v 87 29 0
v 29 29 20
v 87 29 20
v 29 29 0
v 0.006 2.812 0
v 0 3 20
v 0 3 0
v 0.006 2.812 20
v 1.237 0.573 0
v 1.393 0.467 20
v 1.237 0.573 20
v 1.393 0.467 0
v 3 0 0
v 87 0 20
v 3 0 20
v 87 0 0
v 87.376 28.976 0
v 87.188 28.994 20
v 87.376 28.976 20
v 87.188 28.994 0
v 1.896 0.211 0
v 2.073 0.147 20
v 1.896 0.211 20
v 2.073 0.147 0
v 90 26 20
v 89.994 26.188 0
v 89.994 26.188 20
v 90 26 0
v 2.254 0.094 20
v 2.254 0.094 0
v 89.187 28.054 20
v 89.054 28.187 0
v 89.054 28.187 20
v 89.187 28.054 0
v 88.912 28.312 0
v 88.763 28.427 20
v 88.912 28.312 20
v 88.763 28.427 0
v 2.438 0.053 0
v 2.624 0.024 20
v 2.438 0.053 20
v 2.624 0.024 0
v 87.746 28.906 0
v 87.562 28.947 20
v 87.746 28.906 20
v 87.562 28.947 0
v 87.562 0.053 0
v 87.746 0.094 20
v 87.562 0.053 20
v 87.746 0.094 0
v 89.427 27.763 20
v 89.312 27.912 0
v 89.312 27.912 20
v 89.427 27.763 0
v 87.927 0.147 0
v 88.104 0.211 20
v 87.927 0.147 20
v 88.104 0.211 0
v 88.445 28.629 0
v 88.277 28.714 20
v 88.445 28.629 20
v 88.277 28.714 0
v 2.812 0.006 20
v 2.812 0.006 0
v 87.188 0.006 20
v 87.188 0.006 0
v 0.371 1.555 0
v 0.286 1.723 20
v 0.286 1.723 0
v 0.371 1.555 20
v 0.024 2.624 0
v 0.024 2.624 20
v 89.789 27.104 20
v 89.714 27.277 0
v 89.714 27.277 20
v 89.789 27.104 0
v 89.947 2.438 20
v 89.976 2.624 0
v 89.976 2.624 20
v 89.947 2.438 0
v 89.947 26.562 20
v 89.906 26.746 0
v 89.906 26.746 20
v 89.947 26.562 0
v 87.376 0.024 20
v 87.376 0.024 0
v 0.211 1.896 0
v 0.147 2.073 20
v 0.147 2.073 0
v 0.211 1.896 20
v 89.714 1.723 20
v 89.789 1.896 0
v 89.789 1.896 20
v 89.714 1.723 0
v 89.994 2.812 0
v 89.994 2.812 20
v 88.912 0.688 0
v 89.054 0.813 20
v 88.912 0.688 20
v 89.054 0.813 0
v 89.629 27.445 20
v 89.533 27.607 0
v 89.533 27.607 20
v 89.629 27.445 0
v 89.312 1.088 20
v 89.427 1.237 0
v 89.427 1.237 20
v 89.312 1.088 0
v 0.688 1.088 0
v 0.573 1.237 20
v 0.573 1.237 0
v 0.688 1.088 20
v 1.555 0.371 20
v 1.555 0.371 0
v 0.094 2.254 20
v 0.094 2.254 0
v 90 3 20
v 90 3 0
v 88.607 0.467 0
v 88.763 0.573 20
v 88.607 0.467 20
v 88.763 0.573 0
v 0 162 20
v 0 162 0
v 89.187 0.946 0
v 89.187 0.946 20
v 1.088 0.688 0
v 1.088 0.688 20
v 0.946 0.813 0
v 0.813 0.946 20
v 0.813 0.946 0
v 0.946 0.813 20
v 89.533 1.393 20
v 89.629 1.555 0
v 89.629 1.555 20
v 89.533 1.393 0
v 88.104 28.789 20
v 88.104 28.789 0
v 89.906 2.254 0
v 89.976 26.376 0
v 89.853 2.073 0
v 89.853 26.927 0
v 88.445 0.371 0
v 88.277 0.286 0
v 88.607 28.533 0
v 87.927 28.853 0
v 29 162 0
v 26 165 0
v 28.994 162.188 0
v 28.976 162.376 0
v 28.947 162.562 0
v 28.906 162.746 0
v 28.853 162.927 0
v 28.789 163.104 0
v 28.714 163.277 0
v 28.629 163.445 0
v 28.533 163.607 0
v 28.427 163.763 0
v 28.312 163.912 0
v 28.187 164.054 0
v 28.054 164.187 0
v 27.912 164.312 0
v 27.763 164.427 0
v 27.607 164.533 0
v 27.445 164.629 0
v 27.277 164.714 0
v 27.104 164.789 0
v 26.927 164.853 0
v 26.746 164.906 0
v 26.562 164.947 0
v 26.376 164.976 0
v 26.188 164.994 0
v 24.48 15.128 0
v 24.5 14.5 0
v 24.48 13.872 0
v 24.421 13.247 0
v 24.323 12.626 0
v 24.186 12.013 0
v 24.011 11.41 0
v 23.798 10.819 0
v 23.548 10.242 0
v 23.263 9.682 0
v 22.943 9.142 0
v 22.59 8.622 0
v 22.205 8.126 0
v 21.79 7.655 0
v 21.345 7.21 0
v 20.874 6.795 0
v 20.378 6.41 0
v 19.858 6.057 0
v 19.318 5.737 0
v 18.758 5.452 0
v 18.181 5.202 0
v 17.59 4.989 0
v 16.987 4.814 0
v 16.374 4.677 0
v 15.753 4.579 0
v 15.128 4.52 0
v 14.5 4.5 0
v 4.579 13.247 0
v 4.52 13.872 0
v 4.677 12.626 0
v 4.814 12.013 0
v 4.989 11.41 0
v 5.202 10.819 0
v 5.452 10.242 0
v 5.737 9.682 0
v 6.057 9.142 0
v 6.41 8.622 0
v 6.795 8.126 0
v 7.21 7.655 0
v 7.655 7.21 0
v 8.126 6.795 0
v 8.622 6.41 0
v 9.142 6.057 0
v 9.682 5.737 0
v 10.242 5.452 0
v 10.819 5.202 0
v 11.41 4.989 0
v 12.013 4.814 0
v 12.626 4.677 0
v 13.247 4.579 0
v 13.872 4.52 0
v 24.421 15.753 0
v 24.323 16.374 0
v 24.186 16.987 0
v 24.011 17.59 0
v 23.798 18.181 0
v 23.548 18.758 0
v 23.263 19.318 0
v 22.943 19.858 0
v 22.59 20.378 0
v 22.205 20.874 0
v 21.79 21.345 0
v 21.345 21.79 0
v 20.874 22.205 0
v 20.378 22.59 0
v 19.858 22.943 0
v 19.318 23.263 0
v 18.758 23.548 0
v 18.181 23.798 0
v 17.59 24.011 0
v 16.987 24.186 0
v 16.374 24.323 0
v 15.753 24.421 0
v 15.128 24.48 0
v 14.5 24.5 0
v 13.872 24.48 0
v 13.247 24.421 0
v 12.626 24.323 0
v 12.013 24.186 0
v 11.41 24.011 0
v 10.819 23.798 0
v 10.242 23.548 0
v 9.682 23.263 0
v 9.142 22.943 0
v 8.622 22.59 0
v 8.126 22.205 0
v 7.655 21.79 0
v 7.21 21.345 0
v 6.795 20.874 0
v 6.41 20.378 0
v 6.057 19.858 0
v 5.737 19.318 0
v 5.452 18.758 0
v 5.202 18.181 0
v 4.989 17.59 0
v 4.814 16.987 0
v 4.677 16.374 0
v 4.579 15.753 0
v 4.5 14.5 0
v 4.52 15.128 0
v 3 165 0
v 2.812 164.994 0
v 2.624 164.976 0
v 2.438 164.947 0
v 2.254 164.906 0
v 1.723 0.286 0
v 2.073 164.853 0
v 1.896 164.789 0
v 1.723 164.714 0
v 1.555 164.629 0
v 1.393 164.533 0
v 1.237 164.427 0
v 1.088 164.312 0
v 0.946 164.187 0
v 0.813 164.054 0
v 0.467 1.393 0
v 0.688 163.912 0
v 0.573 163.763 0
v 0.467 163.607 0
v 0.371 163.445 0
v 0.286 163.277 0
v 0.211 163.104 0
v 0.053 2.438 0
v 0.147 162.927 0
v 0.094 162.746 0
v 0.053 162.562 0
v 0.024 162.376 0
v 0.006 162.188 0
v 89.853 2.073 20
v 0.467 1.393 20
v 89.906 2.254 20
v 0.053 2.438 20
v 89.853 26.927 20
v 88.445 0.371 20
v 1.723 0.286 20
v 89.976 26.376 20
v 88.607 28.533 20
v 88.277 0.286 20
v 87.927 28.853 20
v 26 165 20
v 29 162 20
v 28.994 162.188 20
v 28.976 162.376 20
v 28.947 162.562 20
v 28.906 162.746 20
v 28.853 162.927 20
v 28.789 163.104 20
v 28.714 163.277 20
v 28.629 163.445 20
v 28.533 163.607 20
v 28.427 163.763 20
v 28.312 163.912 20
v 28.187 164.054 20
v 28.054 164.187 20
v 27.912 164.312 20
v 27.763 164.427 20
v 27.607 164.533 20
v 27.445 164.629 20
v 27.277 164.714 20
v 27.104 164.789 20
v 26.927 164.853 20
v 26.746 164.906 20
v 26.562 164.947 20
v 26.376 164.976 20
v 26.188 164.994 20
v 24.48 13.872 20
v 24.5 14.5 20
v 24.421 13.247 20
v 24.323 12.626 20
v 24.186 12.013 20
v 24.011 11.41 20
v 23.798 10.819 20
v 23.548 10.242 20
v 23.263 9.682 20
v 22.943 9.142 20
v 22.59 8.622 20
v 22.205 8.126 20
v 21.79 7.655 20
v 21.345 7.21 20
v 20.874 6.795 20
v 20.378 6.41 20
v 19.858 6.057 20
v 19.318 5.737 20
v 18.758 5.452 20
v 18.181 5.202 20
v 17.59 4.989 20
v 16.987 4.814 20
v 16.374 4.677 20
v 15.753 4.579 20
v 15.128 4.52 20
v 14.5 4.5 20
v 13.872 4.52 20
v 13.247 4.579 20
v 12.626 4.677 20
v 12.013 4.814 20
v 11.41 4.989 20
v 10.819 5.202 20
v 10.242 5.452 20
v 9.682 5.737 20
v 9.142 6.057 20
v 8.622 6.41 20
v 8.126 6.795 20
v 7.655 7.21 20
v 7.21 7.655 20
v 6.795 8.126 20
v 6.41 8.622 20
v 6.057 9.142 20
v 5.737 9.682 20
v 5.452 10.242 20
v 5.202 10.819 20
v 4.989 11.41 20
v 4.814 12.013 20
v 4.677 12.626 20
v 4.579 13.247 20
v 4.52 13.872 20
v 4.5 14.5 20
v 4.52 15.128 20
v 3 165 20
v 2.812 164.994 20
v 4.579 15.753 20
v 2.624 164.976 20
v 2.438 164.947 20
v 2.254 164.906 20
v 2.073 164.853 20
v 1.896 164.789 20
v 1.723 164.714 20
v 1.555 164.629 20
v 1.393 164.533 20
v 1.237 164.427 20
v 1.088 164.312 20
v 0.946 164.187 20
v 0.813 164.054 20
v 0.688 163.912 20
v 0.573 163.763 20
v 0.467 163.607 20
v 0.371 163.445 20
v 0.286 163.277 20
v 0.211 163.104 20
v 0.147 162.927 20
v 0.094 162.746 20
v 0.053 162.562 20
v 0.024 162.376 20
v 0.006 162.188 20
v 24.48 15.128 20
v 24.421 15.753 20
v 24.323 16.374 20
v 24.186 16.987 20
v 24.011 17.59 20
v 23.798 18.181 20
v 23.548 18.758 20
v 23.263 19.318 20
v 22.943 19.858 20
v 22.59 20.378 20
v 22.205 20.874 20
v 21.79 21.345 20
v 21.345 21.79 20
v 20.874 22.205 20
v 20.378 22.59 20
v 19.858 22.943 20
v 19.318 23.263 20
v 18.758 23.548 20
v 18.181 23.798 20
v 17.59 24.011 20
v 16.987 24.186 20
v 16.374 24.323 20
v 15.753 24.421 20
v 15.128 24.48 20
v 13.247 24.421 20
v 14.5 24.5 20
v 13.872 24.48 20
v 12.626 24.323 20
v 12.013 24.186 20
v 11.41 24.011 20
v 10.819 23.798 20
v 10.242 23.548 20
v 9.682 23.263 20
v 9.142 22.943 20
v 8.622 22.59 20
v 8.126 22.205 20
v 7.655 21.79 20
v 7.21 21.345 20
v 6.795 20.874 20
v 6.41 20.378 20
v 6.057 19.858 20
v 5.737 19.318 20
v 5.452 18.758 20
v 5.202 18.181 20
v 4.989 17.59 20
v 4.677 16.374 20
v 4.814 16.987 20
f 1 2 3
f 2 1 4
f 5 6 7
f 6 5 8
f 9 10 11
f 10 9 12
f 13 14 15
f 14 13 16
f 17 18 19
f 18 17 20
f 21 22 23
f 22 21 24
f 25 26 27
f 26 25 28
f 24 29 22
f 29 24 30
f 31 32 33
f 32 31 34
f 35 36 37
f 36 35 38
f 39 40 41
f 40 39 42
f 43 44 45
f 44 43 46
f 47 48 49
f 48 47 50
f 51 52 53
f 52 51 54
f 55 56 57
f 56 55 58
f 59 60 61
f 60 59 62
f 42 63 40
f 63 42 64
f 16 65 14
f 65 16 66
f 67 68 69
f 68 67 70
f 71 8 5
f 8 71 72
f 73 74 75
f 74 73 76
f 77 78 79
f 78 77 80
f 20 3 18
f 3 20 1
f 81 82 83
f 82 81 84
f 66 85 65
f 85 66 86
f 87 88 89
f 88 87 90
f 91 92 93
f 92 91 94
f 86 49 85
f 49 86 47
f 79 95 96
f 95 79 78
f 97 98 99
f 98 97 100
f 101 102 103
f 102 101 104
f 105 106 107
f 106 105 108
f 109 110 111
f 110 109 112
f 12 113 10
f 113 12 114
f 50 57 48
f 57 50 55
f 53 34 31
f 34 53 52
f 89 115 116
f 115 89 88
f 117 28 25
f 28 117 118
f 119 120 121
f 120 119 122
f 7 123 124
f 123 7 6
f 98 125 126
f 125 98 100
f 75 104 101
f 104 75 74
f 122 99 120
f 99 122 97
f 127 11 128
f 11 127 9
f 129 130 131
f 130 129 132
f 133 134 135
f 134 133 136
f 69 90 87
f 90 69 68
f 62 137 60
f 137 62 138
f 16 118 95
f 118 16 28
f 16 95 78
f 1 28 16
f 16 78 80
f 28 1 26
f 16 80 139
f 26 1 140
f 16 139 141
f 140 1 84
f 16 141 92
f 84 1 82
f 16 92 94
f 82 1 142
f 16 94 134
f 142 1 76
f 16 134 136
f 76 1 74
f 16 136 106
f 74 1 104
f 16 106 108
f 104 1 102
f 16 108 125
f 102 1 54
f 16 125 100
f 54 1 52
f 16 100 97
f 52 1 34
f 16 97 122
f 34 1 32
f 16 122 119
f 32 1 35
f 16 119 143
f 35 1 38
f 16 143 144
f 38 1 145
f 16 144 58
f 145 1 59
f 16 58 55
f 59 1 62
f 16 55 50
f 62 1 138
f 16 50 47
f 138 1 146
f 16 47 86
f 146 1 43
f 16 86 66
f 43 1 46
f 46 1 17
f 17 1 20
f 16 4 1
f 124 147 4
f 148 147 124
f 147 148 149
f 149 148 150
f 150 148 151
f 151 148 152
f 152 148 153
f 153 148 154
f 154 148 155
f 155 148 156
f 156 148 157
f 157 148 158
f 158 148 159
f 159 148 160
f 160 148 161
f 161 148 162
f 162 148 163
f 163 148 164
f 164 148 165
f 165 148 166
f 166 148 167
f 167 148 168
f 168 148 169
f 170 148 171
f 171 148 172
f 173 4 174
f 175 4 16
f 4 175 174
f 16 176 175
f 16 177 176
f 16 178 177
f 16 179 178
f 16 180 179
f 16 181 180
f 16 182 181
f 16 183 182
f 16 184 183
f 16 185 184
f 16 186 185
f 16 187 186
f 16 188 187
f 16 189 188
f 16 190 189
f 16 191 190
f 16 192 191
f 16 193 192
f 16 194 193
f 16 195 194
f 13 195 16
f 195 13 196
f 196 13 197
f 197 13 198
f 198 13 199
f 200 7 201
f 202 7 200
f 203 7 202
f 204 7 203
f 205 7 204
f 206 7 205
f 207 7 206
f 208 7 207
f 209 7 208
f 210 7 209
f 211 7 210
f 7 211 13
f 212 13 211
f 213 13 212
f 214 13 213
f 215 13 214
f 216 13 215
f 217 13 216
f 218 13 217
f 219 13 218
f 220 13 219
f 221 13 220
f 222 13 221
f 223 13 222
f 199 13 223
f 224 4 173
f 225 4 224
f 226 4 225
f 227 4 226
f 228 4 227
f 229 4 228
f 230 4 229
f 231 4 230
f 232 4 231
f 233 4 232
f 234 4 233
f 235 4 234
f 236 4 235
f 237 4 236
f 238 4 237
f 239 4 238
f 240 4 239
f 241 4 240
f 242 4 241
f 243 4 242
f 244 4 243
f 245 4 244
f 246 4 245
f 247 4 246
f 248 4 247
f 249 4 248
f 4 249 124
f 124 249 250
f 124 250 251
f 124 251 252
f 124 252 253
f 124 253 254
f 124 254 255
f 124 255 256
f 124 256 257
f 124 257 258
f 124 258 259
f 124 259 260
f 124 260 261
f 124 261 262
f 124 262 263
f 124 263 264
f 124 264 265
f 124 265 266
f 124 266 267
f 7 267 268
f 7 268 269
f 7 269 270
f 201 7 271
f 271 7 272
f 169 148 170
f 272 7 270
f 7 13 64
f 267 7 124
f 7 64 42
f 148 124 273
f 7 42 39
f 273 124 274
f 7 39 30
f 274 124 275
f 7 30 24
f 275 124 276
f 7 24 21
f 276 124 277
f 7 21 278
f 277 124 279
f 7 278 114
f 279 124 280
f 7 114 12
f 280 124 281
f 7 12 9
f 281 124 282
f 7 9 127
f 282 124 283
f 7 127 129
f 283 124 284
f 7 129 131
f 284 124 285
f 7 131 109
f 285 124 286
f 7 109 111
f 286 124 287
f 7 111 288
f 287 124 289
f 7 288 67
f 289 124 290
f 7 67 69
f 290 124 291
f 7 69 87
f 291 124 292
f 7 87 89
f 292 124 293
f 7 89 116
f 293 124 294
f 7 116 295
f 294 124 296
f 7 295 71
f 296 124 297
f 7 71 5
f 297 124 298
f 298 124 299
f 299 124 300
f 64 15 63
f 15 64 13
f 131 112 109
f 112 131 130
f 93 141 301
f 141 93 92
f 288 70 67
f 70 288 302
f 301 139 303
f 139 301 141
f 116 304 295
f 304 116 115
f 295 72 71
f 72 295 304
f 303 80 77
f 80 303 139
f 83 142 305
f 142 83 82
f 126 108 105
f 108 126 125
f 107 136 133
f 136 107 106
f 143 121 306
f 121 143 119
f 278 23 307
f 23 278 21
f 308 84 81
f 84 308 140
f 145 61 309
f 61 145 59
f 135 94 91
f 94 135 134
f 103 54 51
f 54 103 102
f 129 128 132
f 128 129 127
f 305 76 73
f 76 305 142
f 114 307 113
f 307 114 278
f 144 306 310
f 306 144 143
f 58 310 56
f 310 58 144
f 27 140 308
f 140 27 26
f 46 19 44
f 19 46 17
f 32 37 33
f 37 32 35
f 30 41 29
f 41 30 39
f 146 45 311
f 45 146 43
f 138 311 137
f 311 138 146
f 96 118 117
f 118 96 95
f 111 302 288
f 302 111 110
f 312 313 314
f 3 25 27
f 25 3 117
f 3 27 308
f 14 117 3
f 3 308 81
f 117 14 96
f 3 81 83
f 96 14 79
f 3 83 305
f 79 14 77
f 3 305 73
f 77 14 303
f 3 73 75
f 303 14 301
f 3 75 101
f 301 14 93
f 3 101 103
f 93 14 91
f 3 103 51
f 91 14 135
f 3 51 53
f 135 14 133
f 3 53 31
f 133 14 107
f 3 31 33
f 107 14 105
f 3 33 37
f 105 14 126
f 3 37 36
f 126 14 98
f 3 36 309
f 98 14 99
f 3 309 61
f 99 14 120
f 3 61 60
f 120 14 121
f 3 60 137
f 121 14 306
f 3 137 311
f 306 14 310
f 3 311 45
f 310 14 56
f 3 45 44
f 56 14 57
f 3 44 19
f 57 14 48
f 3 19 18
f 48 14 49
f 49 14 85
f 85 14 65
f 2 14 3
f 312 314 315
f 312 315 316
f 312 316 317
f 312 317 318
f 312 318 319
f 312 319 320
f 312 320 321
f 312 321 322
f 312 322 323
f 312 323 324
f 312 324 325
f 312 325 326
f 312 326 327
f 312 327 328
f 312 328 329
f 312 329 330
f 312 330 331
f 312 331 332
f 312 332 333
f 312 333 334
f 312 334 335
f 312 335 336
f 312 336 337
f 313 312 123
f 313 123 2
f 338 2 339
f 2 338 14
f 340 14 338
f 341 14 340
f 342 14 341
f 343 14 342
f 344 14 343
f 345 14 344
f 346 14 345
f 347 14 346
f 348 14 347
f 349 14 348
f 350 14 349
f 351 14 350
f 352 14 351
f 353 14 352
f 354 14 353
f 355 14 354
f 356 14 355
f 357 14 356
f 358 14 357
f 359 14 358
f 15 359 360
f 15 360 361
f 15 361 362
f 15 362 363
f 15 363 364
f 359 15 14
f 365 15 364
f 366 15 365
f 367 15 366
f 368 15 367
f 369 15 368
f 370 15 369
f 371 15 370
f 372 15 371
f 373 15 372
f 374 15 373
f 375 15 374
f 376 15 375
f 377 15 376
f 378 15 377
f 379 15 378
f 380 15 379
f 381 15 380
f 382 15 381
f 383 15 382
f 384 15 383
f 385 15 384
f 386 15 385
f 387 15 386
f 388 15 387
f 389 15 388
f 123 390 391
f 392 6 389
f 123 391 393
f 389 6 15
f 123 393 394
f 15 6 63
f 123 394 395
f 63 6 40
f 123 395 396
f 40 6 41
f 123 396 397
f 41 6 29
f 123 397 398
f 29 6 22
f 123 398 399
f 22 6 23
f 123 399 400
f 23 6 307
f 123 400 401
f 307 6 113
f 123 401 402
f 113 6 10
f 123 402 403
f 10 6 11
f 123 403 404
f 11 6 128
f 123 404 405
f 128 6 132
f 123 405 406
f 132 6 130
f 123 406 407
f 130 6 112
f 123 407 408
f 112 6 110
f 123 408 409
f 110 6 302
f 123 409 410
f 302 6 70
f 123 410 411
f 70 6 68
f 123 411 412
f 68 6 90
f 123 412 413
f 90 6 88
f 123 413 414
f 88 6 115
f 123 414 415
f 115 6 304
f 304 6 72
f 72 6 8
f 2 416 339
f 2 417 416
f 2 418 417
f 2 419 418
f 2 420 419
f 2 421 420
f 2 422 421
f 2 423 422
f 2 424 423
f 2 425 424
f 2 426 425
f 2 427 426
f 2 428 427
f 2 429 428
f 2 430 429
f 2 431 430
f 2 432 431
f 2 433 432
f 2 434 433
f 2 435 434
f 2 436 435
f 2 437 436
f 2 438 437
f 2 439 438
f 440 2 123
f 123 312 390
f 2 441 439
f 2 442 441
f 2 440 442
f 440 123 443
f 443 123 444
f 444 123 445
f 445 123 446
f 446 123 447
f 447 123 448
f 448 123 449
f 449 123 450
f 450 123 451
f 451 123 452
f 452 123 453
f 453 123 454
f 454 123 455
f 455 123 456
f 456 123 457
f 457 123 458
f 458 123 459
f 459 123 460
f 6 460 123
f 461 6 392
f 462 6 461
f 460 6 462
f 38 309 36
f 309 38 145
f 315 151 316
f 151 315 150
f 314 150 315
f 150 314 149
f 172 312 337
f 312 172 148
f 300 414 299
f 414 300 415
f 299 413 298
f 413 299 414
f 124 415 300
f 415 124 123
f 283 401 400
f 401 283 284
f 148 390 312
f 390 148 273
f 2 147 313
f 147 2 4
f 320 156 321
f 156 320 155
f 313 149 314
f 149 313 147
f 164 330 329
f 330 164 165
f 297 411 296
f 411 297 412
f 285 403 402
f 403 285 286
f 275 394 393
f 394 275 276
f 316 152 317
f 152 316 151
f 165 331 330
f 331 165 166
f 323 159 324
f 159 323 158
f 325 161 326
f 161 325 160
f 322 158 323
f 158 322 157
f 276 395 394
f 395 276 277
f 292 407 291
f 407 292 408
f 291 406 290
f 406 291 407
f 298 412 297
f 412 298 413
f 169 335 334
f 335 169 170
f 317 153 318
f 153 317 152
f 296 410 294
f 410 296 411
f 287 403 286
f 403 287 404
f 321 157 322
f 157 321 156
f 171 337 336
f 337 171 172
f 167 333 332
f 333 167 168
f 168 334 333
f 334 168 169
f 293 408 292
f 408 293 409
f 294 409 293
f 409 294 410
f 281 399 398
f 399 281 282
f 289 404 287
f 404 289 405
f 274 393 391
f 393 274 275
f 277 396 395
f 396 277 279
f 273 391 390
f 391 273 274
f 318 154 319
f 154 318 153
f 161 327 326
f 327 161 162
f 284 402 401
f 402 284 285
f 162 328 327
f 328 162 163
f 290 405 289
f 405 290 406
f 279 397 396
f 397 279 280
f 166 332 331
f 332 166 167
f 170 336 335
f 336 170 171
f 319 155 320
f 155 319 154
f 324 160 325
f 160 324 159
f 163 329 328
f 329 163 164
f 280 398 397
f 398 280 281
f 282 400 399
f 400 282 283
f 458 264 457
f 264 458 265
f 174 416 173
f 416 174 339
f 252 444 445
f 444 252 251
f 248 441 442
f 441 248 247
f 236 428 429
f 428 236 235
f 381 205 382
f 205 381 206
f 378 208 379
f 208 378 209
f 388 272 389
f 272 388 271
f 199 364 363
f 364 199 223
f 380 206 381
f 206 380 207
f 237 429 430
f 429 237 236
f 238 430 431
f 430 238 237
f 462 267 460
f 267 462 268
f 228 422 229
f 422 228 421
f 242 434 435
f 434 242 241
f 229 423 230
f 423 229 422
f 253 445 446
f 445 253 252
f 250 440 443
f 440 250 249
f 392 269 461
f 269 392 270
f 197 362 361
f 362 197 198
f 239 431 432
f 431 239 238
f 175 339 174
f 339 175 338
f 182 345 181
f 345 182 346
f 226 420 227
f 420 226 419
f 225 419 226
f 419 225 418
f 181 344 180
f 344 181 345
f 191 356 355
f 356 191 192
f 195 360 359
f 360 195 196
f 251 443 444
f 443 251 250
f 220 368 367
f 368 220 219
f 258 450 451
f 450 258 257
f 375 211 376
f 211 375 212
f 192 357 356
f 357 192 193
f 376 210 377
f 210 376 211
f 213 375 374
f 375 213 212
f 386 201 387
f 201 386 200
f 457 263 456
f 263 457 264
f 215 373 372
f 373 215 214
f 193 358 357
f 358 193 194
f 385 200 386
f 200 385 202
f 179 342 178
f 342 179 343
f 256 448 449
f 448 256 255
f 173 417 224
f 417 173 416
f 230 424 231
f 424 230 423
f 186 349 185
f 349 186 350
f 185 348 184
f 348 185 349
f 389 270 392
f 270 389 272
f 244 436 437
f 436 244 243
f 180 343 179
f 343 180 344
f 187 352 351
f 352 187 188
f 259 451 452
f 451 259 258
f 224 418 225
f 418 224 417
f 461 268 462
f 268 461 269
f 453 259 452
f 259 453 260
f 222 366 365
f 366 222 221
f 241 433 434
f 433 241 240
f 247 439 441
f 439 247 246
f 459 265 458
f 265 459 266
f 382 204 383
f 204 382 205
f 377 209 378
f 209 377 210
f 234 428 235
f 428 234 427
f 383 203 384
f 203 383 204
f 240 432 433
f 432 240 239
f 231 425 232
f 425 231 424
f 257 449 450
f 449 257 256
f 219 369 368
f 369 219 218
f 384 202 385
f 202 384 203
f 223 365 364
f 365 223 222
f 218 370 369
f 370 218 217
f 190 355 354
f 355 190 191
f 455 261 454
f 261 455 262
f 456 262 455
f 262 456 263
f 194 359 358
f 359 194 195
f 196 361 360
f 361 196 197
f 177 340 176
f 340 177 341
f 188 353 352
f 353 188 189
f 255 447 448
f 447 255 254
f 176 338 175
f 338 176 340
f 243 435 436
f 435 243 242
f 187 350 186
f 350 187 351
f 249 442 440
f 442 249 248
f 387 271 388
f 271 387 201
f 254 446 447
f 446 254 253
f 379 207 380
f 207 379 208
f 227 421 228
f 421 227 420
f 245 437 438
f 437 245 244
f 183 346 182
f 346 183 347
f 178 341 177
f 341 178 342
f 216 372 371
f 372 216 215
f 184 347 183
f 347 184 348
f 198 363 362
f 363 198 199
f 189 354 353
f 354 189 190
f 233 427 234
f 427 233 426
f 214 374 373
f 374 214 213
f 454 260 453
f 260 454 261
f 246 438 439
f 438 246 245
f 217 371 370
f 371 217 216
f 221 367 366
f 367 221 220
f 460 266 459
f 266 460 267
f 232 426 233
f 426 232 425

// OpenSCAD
$fn = 100;

module cube_rounded(v, r=3, center=false){
    translate([r,r,0])
    minkowski(){
        cube([v[0]-(2*r), v[1]-(2*r), v[2]-r], center);
        cylinder(r,r,r);
    }
}

// intersection() {
//     union() {
//         translate([0,0,12]) import("hegra_terrain.stl");
//         cube([200,40,13]);
//     }
//     cube_rounded(v = [200,29,50],r=2);
// }

difference() {
    union() {
        cube_rounded(v = [90,29,20], r=3);
        cube_rounded(v = [29,165,20], r=3);
    }
    translate(v = [29/2,29/2,0]) cylinder(r=10, h=30);
}
